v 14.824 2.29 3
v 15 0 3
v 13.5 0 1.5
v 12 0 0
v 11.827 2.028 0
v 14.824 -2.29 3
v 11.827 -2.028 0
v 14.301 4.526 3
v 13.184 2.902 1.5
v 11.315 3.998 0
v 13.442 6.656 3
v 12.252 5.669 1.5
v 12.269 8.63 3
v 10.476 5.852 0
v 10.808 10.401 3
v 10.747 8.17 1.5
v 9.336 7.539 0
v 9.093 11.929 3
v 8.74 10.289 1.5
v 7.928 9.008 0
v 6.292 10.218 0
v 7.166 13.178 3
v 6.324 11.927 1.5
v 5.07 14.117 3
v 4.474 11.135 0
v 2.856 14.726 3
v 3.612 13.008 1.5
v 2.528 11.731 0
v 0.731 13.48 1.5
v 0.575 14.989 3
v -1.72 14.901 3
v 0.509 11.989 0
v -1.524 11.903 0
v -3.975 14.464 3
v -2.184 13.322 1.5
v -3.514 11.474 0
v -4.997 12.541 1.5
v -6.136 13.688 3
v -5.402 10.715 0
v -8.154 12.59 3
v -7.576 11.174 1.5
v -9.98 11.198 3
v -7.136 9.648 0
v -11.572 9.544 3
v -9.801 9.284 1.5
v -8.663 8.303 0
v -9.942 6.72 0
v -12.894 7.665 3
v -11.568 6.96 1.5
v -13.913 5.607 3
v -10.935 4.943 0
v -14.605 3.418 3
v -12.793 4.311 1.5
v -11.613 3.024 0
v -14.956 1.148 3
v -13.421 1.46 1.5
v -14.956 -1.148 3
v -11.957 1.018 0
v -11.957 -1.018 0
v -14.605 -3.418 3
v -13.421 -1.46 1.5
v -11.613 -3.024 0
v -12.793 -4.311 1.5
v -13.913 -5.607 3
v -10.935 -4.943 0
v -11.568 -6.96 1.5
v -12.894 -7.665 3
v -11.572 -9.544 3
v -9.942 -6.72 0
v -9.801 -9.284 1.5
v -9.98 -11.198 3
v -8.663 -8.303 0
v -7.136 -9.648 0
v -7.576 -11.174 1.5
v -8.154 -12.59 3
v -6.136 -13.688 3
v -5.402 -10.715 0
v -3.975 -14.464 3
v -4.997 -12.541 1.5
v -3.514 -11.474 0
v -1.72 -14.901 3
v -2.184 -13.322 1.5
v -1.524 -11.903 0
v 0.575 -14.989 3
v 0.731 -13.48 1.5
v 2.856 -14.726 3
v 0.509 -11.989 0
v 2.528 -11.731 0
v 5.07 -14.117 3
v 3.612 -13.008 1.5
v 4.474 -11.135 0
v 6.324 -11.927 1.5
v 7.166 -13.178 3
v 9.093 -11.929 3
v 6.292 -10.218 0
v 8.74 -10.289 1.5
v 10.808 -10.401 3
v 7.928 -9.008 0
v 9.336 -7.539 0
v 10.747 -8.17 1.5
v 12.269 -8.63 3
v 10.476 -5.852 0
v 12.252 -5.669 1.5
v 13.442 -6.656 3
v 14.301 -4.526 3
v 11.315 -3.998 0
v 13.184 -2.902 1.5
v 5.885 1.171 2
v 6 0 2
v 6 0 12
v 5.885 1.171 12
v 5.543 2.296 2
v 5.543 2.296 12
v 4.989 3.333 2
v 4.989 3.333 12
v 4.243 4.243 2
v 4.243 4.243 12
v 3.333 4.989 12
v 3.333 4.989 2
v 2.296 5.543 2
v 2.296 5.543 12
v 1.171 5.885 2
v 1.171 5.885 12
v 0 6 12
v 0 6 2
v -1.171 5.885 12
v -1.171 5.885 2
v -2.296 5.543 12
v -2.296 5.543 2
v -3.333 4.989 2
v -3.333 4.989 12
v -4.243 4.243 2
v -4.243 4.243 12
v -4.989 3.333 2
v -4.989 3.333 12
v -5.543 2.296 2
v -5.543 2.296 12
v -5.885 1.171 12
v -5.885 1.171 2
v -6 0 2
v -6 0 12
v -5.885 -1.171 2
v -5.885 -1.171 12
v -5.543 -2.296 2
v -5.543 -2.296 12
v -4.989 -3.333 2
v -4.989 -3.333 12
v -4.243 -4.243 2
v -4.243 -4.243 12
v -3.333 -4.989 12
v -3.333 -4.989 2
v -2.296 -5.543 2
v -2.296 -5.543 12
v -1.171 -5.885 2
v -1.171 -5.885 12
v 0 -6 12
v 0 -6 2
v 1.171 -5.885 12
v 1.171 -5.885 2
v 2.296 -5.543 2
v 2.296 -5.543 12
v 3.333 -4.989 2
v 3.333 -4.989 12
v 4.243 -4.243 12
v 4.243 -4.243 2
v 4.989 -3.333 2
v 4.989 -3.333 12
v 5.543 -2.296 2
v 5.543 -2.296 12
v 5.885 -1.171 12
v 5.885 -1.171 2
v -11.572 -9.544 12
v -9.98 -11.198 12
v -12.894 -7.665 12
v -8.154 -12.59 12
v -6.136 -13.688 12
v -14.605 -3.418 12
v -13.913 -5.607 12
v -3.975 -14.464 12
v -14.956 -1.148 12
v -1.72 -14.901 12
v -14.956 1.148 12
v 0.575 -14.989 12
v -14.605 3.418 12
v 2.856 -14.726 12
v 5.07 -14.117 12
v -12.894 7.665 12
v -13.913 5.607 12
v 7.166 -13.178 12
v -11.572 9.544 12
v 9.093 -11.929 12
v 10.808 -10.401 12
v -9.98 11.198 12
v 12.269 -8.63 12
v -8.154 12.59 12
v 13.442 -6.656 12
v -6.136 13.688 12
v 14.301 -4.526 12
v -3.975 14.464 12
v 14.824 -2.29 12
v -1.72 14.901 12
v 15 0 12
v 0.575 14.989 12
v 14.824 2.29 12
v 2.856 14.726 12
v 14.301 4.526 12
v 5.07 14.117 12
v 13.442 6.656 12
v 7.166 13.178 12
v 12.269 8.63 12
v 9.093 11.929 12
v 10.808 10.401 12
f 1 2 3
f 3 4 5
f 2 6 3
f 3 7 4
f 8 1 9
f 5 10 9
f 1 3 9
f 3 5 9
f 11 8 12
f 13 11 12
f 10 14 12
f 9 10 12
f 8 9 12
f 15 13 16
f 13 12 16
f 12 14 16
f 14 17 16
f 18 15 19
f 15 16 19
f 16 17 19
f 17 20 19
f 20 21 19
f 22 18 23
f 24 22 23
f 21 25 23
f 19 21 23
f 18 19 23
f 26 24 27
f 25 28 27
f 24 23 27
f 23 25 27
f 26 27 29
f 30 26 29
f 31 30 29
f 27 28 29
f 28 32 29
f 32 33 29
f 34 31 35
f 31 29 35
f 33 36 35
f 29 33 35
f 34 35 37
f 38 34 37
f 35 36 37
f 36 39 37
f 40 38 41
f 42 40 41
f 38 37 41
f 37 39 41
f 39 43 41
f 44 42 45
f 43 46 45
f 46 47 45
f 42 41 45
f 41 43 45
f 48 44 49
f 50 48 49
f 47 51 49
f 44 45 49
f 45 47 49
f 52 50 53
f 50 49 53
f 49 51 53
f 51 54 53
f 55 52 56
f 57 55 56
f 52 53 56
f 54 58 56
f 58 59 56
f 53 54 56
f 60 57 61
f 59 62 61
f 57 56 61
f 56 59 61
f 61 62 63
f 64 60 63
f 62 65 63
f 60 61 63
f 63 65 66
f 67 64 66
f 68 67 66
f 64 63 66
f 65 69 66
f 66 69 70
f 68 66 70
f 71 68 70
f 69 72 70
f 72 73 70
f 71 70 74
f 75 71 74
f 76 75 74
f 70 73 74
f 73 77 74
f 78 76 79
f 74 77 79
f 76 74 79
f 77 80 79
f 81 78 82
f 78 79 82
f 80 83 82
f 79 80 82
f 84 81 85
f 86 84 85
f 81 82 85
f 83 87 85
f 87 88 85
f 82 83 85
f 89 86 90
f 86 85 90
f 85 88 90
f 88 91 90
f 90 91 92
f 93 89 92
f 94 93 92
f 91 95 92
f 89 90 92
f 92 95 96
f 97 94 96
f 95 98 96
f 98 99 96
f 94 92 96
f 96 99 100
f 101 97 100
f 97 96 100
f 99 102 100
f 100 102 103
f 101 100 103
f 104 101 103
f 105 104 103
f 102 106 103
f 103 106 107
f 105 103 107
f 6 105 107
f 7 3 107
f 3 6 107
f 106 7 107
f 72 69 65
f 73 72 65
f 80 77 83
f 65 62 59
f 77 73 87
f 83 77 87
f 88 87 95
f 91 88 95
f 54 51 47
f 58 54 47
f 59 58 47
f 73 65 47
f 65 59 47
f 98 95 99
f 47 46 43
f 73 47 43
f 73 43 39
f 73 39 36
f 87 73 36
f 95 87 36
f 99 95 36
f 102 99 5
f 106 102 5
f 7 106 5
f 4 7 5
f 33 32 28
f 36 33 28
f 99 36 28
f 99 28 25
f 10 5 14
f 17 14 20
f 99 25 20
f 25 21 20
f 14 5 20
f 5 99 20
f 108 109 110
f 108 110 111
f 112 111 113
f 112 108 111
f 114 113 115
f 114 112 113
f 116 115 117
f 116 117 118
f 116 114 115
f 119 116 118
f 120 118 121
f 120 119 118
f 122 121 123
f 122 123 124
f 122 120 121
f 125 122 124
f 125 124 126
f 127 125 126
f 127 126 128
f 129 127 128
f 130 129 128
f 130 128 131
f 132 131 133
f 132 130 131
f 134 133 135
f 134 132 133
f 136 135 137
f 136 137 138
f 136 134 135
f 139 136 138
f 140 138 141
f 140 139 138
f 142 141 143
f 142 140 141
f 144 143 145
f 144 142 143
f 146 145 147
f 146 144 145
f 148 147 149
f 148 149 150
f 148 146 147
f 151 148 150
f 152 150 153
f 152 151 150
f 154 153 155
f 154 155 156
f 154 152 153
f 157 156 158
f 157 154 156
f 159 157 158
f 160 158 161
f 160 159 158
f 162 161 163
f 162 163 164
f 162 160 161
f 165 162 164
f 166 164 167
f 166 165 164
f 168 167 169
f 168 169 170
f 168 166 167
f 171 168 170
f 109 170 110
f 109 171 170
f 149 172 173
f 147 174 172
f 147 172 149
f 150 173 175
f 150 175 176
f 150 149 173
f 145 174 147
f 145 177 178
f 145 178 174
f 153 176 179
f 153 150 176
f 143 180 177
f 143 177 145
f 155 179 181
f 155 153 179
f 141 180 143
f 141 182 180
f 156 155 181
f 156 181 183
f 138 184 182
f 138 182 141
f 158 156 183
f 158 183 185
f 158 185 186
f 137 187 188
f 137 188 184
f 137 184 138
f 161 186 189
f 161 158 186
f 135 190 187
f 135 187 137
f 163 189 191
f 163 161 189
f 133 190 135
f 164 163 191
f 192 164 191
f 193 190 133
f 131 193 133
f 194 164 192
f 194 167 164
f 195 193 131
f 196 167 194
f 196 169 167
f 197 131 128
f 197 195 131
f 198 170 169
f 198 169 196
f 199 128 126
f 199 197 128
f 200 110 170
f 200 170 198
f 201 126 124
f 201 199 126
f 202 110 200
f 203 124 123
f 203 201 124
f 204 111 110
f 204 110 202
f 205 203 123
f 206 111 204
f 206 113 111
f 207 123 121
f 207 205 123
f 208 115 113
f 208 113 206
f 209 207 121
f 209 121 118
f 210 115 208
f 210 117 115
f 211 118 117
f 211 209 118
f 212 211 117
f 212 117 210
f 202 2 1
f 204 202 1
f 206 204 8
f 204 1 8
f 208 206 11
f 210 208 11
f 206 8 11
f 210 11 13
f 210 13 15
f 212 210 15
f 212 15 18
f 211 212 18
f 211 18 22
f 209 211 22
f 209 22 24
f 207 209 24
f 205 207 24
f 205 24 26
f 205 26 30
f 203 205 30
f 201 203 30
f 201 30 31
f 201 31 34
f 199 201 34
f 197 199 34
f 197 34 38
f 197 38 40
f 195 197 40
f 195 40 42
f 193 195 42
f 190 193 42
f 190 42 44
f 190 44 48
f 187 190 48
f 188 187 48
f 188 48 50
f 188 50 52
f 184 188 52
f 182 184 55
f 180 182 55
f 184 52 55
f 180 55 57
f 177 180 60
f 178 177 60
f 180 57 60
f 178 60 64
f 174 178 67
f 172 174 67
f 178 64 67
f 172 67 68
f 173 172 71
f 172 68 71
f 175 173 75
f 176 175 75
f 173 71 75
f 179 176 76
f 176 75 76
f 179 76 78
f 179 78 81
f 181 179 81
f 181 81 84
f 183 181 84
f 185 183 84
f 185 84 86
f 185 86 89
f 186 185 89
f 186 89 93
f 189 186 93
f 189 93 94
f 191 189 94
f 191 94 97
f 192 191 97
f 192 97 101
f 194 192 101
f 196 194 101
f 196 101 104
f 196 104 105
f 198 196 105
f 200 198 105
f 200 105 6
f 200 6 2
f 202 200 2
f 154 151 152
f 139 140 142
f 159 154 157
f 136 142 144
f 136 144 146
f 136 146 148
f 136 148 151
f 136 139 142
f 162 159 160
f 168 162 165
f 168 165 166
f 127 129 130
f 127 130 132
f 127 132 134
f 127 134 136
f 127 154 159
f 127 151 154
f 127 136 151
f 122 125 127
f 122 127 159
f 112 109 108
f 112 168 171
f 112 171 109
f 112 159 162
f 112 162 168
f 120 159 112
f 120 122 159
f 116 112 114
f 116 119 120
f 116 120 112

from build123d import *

# Parameters (mm, degrees)
SKETCH_1_R      = 15
EXTRUDE_1_DEPTH = 2
SKETCH_2_R      = 15
SKETCH_2_R_2    = 6
EXTRUDE_2_DEPTH = 10
CHAMFER_1_SIZE  = 3


with BuildPart() as part:
    # 草图1 → 凸台-拉伸1 (new body)
    with BuildSketch(Plane.XY):
        Circle(SKETCH_1_R)
    extrude(amount=EXTRUDE_1_DEPTH)

    # 草图2 → 凸台-拉伸2 (add)
    with BuildSketch(Plane.XY.offset(2)):
        Circle(SKETCH_2_R)
        Circle(SKETCH_2_R_2, mode=Mode.SUBTRACT)
    extrude(amount=EXTRUDE_2_DEPTH)

    # 倒角1
    chamfer_1_edges = [part.edges().sort_by_distance(p)[0] for p in [
        (-15, 0, 0),
    ]]
    chamfer(chamfer_1_edges, length=CHAMFER_1_SIZE)


solid = part.part
